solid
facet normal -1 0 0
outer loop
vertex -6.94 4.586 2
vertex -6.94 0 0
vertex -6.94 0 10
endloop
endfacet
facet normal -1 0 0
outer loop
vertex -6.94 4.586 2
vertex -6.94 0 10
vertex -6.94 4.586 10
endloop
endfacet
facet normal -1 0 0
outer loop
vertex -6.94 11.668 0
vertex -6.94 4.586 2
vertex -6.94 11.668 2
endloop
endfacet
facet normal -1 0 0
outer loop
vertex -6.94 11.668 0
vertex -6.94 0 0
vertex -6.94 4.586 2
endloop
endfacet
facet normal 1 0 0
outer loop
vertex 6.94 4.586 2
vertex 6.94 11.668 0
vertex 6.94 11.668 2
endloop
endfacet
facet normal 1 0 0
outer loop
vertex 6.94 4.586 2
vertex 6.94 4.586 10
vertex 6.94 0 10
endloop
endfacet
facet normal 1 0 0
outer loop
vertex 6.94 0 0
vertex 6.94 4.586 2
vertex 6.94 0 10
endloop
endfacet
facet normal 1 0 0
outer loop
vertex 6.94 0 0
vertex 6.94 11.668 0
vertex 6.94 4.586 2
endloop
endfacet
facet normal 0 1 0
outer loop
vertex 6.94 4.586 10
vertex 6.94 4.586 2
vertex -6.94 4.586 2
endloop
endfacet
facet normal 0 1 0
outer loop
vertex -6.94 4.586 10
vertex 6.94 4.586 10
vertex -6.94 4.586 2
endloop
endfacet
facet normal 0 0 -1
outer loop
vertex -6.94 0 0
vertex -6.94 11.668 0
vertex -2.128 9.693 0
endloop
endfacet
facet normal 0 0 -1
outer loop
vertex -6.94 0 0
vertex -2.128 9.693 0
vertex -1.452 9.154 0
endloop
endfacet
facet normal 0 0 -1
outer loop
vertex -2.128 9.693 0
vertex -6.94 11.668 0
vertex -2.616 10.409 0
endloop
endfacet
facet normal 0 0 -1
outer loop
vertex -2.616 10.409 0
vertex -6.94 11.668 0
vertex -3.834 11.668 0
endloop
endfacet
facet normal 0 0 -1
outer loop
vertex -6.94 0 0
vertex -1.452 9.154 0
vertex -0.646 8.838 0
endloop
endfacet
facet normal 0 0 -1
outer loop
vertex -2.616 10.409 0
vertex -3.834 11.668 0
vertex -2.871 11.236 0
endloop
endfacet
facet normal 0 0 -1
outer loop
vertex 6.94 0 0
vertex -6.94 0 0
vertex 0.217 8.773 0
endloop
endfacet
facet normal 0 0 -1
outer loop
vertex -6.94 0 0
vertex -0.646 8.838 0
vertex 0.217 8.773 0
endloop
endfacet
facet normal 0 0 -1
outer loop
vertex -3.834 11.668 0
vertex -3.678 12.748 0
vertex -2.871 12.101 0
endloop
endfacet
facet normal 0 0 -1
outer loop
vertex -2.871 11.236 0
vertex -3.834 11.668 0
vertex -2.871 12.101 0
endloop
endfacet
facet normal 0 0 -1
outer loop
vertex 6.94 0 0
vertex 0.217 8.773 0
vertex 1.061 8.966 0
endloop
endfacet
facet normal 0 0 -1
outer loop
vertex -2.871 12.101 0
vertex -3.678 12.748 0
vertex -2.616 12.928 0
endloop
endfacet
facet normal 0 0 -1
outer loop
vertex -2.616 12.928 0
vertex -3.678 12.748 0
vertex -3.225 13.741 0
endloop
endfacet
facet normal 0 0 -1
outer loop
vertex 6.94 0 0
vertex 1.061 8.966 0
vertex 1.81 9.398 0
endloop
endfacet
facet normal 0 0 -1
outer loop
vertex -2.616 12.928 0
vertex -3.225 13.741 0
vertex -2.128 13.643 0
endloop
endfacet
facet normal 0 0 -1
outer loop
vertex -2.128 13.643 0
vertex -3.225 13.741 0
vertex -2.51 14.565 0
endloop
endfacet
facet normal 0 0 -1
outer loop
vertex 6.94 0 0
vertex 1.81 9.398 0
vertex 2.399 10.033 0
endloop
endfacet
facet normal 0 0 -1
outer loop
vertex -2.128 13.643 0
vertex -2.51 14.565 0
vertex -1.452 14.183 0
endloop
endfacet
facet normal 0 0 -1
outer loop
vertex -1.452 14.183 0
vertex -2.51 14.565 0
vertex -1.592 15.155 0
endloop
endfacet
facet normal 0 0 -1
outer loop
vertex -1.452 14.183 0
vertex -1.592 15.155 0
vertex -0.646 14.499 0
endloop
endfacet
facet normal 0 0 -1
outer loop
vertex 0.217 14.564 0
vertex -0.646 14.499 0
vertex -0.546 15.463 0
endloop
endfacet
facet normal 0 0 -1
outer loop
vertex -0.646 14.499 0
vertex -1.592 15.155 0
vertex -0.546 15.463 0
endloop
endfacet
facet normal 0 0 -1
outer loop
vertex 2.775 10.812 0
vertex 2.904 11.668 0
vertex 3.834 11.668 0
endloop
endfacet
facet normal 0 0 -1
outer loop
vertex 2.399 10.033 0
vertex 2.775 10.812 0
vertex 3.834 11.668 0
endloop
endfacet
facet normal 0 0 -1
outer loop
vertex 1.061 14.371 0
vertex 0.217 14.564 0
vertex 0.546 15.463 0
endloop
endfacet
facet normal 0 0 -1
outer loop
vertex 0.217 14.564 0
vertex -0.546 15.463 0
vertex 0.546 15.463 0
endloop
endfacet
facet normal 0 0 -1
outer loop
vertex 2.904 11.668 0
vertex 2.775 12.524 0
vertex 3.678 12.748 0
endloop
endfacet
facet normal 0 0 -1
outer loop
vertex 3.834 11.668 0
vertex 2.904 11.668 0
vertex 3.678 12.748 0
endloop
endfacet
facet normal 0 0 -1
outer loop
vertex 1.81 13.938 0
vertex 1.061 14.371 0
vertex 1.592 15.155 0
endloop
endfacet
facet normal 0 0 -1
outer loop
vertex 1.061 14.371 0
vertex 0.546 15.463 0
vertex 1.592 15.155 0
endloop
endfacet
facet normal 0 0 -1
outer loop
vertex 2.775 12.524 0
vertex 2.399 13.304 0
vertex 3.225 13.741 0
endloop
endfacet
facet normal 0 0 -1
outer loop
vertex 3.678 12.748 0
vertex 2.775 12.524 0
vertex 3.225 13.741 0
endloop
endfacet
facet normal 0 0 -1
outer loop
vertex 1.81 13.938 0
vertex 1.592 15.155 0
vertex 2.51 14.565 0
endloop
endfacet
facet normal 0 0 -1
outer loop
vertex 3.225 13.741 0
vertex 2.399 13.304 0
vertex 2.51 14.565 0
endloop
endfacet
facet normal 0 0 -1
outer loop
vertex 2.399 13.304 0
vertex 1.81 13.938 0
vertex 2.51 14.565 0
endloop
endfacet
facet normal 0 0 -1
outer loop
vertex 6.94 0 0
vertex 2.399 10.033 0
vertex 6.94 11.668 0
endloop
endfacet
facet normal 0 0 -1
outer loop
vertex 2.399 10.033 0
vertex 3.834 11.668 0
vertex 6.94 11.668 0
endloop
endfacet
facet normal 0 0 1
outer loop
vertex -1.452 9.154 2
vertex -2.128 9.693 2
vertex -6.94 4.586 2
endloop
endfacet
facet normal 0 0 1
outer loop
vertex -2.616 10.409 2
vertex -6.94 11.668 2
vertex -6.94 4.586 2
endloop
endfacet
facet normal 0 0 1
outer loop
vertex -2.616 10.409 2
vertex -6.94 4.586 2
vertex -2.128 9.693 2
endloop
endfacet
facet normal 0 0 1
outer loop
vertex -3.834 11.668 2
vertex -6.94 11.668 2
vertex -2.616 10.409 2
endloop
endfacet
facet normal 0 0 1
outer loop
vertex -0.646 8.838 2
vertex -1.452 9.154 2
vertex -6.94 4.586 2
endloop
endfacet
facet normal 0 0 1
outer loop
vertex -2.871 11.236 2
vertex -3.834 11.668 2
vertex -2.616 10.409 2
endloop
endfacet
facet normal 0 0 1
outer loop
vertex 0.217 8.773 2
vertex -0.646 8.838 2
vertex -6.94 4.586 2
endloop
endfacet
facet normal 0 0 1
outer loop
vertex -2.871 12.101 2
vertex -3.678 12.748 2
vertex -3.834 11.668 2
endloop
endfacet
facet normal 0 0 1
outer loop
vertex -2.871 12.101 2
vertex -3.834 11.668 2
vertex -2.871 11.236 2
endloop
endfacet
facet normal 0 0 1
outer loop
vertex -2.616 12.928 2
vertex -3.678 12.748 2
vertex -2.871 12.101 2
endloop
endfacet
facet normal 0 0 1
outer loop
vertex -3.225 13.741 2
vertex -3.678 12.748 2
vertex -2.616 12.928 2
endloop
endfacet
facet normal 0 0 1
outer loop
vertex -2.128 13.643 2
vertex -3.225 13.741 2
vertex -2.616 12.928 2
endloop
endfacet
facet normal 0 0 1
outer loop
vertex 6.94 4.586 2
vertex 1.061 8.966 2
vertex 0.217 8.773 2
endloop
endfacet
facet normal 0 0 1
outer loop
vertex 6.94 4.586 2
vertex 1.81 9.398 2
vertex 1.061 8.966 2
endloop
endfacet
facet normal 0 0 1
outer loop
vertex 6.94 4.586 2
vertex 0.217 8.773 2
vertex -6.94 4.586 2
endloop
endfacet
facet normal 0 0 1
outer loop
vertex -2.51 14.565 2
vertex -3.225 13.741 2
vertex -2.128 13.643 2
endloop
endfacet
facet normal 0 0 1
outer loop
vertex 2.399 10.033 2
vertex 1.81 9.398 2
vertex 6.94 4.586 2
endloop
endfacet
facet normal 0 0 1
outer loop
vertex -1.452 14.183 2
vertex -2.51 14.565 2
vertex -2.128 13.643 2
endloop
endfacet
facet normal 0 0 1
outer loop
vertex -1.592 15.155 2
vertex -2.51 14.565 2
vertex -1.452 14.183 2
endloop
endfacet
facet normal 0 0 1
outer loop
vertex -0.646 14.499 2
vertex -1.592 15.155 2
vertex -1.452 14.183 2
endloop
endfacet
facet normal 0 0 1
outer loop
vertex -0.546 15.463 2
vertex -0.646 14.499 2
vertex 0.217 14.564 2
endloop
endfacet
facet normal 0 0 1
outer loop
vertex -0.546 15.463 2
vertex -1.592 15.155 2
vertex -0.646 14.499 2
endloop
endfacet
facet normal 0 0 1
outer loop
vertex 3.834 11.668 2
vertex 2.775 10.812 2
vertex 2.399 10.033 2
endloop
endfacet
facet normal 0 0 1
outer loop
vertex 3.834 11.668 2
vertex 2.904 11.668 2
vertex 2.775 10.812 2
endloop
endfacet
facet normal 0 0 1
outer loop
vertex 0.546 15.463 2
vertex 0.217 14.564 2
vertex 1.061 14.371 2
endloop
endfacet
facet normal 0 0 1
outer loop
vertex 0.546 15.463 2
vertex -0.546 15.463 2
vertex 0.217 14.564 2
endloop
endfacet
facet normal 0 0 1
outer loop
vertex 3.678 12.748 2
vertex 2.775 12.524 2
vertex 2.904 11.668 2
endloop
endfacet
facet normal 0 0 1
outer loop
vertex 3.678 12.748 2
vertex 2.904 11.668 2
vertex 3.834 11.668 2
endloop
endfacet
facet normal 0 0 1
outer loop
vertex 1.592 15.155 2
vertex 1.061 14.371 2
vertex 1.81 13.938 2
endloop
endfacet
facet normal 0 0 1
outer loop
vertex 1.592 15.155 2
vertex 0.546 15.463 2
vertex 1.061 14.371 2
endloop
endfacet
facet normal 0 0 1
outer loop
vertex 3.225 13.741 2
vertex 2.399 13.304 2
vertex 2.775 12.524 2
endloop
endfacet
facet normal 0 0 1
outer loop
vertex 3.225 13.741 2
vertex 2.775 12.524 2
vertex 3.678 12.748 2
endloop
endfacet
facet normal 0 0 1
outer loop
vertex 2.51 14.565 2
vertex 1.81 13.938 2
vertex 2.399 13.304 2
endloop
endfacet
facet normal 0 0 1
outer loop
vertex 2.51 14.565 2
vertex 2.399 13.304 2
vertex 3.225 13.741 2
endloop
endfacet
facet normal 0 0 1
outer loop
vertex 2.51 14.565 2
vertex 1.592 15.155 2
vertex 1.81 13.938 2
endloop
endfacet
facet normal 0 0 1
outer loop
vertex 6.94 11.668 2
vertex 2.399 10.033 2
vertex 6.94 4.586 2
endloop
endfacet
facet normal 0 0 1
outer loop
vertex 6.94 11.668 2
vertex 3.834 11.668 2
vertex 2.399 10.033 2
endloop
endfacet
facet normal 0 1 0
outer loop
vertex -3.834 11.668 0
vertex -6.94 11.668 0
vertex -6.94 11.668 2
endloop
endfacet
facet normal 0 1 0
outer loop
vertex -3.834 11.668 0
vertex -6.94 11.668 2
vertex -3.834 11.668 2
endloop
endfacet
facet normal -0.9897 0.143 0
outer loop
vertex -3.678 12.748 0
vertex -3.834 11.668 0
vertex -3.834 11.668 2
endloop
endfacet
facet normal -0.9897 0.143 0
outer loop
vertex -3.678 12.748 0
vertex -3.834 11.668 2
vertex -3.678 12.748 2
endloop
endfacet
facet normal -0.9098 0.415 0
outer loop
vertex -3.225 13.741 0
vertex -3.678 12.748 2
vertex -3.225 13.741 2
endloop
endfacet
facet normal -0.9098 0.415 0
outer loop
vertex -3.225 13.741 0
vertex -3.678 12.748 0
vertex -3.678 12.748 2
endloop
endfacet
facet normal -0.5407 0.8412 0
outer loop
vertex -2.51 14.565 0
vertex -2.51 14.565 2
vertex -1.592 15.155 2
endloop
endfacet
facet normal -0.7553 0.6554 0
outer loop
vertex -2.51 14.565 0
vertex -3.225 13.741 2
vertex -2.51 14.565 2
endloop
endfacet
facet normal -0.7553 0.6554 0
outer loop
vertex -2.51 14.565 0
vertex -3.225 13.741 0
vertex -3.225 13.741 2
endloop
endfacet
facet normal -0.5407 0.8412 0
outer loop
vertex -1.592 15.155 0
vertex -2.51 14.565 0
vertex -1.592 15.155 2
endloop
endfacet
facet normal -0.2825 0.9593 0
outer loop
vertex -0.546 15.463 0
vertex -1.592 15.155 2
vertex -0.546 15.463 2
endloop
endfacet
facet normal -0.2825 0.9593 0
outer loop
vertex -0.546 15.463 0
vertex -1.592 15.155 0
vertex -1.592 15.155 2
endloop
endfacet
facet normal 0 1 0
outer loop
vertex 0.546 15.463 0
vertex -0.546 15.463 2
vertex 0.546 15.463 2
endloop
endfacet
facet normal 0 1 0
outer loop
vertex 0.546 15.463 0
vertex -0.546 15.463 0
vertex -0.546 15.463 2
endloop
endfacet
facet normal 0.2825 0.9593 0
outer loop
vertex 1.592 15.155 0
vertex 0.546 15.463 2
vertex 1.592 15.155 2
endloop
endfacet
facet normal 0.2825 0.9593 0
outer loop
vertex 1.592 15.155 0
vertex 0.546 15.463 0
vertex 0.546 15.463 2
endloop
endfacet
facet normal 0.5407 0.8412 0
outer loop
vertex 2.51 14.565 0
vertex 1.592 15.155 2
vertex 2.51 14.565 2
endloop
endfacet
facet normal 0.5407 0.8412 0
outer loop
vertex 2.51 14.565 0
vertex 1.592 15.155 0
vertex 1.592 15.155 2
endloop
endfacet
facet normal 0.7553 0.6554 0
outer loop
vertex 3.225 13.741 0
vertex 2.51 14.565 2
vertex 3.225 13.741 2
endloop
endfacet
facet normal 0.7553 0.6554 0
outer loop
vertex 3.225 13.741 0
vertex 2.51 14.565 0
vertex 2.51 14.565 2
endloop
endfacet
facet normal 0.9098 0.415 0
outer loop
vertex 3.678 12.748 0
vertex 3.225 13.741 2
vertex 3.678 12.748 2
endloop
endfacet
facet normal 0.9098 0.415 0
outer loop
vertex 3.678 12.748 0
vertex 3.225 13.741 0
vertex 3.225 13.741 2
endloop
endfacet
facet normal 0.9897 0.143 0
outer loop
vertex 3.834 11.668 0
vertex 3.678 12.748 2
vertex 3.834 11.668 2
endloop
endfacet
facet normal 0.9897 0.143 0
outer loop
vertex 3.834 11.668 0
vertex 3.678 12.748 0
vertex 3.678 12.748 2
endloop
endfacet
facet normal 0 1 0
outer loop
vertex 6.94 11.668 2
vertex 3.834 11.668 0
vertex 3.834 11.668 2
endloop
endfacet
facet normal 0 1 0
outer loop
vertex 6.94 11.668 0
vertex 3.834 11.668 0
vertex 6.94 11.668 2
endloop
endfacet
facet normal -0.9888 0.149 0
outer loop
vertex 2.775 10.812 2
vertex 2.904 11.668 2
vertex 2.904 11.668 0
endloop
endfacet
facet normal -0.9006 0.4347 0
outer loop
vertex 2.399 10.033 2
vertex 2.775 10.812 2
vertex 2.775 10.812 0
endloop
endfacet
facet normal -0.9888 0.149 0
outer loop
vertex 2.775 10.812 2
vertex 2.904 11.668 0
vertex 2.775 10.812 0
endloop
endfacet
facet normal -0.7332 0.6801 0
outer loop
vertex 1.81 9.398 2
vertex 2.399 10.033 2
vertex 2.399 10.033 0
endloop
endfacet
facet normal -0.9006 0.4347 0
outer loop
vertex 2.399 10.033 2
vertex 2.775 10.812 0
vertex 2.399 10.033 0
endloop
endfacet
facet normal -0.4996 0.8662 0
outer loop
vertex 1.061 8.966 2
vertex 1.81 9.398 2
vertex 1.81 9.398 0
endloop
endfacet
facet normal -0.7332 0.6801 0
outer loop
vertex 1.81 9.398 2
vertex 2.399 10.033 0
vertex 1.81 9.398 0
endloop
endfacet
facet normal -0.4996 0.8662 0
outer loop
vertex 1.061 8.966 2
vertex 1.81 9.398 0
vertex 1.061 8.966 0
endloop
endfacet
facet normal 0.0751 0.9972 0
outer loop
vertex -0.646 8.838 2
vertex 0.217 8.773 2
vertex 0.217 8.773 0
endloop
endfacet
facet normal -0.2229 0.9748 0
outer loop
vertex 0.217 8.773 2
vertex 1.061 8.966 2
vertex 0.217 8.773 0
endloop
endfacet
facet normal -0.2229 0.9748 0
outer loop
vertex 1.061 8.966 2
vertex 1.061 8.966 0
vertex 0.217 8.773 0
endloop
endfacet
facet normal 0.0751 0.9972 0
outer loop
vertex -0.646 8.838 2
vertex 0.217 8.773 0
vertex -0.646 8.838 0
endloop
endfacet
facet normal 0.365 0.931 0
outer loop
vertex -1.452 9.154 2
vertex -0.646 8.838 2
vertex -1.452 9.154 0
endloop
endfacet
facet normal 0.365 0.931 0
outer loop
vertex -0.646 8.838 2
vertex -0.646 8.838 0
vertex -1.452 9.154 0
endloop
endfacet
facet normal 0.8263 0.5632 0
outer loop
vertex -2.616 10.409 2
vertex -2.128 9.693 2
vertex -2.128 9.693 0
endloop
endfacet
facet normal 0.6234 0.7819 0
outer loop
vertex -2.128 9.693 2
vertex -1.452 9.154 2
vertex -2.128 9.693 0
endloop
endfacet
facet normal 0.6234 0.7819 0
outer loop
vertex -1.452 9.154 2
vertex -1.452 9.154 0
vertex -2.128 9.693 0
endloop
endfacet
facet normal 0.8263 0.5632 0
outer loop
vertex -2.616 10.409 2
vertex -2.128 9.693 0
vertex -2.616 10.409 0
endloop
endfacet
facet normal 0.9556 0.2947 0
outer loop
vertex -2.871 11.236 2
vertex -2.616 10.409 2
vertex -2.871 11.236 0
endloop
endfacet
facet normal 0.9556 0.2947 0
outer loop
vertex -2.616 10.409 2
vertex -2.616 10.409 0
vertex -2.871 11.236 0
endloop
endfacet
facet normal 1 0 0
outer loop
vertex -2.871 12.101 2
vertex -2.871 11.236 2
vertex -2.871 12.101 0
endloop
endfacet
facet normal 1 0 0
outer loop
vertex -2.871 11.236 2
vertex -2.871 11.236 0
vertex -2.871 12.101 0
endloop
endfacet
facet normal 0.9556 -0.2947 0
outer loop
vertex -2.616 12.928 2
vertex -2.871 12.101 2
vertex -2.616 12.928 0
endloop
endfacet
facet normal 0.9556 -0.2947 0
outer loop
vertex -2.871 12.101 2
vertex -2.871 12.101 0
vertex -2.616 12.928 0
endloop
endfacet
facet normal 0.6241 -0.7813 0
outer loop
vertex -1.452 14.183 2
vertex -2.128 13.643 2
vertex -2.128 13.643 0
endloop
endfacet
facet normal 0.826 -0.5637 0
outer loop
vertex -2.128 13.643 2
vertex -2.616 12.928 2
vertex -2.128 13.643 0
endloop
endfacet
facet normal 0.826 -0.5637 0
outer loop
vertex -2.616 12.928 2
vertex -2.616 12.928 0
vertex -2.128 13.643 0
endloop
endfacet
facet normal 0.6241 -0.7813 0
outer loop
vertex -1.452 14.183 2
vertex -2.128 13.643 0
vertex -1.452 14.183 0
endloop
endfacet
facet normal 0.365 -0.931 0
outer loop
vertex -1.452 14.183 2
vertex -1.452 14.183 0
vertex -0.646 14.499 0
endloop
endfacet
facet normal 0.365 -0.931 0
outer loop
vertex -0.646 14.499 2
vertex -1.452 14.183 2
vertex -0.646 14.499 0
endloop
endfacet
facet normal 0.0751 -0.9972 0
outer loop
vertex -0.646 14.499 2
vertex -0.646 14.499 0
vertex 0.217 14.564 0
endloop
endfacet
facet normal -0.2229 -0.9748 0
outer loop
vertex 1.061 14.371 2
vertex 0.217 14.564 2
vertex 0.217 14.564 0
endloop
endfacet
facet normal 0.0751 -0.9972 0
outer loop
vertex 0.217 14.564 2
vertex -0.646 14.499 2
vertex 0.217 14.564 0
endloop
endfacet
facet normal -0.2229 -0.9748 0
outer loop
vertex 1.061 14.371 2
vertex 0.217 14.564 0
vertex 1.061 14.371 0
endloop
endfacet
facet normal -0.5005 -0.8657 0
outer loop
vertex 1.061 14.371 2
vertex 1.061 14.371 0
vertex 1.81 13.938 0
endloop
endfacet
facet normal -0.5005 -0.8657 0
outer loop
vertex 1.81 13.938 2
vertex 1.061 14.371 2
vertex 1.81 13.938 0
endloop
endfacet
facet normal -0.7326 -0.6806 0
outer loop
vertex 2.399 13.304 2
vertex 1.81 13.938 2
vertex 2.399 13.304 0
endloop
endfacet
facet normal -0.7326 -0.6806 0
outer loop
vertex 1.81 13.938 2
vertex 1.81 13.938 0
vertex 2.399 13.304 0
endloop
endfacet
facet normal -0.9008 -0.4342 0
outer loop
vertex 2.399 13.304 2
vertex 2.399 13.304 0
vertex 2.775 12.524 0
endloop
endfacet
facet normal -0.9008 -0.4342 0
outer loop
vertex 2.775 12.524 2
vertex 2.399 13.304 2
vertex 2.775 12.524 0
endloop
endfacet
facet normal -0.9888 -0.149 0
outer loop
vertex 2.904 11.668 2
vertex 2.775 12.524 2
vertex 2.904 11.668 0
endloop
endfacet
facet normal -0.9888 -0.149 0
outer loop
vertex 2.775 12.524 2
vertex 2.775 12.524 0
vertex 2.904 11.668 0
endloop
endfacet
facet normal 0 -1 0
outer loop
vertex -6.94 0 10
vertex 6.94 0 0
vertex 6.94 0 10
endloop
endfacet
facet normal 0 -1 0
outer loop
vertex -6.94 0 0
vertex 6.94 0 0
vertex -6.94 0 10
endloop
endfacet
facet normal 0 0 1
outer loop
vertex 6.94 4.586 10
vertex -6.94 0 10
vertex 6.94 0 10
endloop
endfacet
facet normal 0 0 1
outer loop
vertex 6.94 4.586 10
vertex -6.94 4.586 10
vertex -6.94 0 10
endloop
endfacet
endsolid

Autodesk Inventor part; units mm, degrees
ref_plane "YZ Plane" through (0, 0, 0) normal (1, 0, 0) x (0, 1, 0)
ref_plane "XZ Plane" through (0, 0, 0) normal (0, 1, 0) x (-1, 0, 0)
ref_plane "XY Plane" through (0, 0, 0) normal (0, 0, 1) x (1, 0, 0)
sketch "Sketch1" plane through (0, 0, 0) normal (0, 0, 1) x (1, 0, 0)
  line L0 (-6.9396, 11.6683) -> (6.9396, 11.6683)
  line L1 (6.9396, 11.6683) -> (6.9396, 0)
  line L2 (6.9396, 0) -> (-6.9396, 0)
  line L3 (-6.9396, 0) -> (-6.9396, 11.6683)
  circle A0 centre (0, 11.6683) radius 3.8335
  circle A1 centre (0, 11.6683) radius 2.9035
  point P0 (0, 0)
  point P1 (0, 0)
  point P2 (3.8335, 11.6683)
  point P3 (-3.8335, 11.6683)
extrude "Extrusion1" add sketch "Sketch1" along normal blind 2 contours A1 L0 A0 | L0 A0 A1 | L0 L1 L2 L3 A0
sketch "Sketch2" plane through (0, 0, 0) normal (0, 0, 1) x (1, 0, 0)
  line L0 (-6.9396, 11.6683) -> (-6.9396, 0) projected
  line L1 (-6.9396, 0) -> (6.9396, 0)
  line L2 (6.9396, 0) -> (6.9396, 4.5855)
  line L3 (6.9396, 4.5855) -> (-6.9396, 4.5855)
  line L4 (-6.9396, 4.5855) -> (-6.9396, 0)
  line L5 (6.9396, 0) -> (6.9396, 11.6683) projected
  point P0 (0, 0)
extrude "Extrusion2" add sketch "Sketch2" along normal blind 10
properties part number "exercise2"
